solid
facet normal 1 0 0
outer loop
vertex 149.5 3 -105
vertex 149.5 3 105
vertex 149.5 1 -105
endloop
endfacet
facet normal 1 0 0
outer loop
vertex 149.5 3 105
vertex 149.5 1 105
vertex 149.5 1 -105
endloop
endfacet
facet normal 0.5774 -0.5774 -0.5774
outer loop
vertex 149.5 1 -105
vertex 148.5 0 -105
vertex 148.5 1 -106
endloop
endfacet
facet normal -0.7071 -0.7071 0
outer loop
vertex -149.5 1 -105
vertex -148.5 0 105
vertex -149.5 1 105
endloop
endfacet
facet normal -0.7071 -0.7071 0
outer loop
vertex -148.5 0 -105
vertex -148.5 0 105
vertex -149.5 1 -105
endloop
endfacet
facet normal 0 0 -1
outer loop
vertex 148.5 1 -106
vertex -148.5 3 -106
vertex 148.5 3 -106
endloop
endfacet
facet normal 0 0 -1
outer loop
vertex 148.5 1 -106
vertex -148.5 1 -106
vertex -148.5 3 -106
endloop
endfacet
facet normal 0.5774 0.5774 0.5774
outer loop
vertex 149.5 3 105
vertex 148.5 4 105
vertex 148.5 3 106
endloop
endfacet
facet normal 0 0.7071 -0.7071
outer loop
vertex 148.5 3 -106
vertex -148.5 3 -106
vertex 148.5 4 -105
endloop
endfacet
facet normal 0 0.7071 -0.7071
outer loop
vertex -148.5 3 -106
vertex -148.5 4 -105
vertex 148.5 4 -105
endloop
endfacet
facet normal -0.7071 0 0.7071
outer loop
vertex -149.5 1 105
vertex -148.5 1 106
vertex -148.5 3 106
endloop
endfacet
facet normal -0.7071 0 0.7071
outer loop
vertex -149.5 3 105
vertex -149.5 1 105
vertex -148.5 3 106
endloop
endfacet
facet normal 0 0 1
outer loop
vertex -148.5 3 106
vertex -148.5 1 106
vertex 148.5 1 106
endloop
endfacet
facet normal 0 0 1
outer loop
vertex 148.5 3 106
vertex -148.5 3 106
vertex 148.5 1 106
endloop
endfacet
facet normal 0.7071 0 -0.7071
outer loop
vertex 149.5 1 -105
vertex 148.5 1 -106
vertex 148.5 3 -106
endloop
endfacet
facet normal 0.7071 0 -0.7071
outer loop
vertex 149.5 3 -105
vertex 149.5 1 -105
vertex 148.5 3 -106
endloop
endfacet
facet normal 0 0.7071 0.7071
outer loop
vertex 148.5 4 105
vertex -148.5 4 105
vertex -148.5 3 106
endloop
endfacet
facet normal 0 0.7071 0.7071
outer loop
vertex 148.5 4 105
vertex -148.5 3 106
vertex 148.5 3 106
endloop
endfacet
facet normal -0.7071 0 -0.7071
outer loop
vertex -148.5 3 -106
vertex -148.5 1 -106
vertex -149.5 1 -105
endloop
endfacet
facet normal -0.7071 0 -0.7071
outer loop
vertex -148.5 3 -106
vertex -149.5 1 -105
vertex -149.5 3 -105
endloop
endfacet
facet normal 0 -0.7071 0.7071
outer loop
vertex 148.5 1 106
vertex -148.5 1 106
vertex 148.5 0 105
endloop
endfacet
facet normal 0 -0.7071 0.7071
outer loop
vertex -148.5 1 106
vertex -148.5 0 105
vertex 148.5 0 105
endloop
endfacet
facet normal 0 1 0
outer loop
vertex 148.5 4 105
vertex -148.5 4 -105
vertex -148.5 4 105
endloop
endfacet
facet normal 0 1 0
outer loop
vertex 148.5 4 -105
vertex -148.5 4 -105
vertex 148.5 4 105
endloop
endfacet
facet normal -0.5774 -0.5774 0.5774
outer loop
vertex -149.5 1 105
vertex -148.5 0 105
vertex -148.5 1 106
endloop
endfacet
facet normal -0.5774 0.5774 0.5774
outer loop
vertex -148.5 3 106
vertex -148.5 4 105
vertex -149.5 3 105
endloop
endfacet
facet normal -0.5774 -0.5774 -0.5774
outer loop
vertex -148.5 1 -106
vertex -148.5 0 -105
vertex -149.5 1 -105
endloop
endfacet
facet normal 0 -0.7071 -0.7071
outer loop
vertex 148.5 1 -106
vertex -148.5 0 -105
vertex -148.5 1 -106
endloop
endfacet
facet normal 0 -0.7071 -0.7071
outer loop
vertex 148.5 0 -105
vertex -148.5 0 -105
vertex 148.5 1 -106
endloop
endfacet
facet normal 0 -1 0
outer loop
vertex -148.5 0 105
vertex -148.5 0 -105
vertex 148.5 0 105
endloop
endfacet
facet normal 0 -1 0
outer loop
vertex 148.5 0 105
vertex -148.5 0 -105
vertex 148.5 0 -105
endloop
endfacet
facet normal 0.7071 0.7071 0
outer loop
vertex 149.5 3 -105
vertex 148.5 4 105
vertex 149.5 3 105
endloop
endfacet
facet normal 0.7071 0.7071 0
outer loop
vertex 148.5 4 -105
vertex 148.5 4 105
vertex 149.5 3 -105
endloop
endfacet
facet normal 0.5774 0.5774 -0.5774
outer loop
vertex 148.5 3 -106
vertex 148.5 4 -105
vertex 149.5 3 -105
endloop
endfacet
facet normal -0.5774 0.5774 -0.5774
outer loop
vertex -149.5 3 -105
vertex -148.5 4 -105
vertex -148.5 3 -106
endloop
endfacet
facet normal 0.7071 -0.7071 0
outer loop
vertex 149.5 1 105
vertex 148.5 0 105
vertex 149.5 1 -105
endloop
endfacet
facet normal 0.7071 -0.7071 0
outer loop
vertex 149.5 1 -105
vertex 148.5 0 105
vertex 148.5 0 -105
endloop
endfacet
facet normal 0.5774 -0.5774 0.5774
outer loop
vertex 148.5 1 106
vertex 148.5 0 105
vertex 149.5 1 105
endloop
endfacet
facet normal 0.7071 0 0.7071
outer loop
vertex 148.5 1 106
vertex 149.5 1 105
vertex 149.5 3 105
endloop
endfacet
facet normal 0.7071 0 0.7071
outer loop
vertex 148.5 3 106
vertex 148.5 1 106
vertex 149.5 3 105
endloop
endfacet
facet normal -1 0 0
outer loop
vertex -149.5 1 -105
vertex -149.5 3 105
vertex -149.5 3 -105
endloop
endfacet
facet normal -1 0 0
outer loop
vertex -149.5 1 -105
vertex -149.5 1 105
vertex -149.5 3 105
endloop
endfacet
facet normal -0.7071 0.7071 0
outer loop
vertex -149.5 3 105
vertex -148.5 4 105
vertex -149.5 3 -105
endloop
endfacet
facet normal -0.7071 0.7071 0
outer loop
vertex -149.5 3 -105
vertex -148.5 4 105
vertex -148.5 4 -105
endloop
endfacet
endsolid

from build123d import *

# Parameters (mm, degrees)
CROQUIS1_W              = 299
CROQUIS1_H              = 212
SALIENTE_EXTRUIR1_DEPTH = 4
CHAFL_N1_SIZE           = 1


with BuildPart() as part:
    # Croquis1 → Saliente-Extruir1 (new body)
    with BuildSketch(Plane(origin=(0, 0, 0), x_dir=(1, 0, 0), z_dir=(0, 1, 0))):
        Rectangle(CROQUIS1_W, CROQUIS1_H)
    extrude(amount=SALIENTE_EXTRUIR1_DEPTH)

    # Chaflán1
    chafl_n1_edges = [part.edges().sort_by_distance(p)[0] for p in [
        (149.5, 4, 0),
        (0, 4, -106),
        (-149.5, 4, 0),
        (0, 0, -106),
        (149.5, 0, 0),
        (0, 0, 106),
        (-149.5, 0, 0),
        (0, 4, 106),
        (-149.5, 2, -106),
        (149.5, 2, -106),
        (149.5, 2, 106),
        (-149.5, 2, 106),
    ]]
    chamfer(chafl_n1_edges, length=CHAFL_N1_SIZE)


solid = part.part
